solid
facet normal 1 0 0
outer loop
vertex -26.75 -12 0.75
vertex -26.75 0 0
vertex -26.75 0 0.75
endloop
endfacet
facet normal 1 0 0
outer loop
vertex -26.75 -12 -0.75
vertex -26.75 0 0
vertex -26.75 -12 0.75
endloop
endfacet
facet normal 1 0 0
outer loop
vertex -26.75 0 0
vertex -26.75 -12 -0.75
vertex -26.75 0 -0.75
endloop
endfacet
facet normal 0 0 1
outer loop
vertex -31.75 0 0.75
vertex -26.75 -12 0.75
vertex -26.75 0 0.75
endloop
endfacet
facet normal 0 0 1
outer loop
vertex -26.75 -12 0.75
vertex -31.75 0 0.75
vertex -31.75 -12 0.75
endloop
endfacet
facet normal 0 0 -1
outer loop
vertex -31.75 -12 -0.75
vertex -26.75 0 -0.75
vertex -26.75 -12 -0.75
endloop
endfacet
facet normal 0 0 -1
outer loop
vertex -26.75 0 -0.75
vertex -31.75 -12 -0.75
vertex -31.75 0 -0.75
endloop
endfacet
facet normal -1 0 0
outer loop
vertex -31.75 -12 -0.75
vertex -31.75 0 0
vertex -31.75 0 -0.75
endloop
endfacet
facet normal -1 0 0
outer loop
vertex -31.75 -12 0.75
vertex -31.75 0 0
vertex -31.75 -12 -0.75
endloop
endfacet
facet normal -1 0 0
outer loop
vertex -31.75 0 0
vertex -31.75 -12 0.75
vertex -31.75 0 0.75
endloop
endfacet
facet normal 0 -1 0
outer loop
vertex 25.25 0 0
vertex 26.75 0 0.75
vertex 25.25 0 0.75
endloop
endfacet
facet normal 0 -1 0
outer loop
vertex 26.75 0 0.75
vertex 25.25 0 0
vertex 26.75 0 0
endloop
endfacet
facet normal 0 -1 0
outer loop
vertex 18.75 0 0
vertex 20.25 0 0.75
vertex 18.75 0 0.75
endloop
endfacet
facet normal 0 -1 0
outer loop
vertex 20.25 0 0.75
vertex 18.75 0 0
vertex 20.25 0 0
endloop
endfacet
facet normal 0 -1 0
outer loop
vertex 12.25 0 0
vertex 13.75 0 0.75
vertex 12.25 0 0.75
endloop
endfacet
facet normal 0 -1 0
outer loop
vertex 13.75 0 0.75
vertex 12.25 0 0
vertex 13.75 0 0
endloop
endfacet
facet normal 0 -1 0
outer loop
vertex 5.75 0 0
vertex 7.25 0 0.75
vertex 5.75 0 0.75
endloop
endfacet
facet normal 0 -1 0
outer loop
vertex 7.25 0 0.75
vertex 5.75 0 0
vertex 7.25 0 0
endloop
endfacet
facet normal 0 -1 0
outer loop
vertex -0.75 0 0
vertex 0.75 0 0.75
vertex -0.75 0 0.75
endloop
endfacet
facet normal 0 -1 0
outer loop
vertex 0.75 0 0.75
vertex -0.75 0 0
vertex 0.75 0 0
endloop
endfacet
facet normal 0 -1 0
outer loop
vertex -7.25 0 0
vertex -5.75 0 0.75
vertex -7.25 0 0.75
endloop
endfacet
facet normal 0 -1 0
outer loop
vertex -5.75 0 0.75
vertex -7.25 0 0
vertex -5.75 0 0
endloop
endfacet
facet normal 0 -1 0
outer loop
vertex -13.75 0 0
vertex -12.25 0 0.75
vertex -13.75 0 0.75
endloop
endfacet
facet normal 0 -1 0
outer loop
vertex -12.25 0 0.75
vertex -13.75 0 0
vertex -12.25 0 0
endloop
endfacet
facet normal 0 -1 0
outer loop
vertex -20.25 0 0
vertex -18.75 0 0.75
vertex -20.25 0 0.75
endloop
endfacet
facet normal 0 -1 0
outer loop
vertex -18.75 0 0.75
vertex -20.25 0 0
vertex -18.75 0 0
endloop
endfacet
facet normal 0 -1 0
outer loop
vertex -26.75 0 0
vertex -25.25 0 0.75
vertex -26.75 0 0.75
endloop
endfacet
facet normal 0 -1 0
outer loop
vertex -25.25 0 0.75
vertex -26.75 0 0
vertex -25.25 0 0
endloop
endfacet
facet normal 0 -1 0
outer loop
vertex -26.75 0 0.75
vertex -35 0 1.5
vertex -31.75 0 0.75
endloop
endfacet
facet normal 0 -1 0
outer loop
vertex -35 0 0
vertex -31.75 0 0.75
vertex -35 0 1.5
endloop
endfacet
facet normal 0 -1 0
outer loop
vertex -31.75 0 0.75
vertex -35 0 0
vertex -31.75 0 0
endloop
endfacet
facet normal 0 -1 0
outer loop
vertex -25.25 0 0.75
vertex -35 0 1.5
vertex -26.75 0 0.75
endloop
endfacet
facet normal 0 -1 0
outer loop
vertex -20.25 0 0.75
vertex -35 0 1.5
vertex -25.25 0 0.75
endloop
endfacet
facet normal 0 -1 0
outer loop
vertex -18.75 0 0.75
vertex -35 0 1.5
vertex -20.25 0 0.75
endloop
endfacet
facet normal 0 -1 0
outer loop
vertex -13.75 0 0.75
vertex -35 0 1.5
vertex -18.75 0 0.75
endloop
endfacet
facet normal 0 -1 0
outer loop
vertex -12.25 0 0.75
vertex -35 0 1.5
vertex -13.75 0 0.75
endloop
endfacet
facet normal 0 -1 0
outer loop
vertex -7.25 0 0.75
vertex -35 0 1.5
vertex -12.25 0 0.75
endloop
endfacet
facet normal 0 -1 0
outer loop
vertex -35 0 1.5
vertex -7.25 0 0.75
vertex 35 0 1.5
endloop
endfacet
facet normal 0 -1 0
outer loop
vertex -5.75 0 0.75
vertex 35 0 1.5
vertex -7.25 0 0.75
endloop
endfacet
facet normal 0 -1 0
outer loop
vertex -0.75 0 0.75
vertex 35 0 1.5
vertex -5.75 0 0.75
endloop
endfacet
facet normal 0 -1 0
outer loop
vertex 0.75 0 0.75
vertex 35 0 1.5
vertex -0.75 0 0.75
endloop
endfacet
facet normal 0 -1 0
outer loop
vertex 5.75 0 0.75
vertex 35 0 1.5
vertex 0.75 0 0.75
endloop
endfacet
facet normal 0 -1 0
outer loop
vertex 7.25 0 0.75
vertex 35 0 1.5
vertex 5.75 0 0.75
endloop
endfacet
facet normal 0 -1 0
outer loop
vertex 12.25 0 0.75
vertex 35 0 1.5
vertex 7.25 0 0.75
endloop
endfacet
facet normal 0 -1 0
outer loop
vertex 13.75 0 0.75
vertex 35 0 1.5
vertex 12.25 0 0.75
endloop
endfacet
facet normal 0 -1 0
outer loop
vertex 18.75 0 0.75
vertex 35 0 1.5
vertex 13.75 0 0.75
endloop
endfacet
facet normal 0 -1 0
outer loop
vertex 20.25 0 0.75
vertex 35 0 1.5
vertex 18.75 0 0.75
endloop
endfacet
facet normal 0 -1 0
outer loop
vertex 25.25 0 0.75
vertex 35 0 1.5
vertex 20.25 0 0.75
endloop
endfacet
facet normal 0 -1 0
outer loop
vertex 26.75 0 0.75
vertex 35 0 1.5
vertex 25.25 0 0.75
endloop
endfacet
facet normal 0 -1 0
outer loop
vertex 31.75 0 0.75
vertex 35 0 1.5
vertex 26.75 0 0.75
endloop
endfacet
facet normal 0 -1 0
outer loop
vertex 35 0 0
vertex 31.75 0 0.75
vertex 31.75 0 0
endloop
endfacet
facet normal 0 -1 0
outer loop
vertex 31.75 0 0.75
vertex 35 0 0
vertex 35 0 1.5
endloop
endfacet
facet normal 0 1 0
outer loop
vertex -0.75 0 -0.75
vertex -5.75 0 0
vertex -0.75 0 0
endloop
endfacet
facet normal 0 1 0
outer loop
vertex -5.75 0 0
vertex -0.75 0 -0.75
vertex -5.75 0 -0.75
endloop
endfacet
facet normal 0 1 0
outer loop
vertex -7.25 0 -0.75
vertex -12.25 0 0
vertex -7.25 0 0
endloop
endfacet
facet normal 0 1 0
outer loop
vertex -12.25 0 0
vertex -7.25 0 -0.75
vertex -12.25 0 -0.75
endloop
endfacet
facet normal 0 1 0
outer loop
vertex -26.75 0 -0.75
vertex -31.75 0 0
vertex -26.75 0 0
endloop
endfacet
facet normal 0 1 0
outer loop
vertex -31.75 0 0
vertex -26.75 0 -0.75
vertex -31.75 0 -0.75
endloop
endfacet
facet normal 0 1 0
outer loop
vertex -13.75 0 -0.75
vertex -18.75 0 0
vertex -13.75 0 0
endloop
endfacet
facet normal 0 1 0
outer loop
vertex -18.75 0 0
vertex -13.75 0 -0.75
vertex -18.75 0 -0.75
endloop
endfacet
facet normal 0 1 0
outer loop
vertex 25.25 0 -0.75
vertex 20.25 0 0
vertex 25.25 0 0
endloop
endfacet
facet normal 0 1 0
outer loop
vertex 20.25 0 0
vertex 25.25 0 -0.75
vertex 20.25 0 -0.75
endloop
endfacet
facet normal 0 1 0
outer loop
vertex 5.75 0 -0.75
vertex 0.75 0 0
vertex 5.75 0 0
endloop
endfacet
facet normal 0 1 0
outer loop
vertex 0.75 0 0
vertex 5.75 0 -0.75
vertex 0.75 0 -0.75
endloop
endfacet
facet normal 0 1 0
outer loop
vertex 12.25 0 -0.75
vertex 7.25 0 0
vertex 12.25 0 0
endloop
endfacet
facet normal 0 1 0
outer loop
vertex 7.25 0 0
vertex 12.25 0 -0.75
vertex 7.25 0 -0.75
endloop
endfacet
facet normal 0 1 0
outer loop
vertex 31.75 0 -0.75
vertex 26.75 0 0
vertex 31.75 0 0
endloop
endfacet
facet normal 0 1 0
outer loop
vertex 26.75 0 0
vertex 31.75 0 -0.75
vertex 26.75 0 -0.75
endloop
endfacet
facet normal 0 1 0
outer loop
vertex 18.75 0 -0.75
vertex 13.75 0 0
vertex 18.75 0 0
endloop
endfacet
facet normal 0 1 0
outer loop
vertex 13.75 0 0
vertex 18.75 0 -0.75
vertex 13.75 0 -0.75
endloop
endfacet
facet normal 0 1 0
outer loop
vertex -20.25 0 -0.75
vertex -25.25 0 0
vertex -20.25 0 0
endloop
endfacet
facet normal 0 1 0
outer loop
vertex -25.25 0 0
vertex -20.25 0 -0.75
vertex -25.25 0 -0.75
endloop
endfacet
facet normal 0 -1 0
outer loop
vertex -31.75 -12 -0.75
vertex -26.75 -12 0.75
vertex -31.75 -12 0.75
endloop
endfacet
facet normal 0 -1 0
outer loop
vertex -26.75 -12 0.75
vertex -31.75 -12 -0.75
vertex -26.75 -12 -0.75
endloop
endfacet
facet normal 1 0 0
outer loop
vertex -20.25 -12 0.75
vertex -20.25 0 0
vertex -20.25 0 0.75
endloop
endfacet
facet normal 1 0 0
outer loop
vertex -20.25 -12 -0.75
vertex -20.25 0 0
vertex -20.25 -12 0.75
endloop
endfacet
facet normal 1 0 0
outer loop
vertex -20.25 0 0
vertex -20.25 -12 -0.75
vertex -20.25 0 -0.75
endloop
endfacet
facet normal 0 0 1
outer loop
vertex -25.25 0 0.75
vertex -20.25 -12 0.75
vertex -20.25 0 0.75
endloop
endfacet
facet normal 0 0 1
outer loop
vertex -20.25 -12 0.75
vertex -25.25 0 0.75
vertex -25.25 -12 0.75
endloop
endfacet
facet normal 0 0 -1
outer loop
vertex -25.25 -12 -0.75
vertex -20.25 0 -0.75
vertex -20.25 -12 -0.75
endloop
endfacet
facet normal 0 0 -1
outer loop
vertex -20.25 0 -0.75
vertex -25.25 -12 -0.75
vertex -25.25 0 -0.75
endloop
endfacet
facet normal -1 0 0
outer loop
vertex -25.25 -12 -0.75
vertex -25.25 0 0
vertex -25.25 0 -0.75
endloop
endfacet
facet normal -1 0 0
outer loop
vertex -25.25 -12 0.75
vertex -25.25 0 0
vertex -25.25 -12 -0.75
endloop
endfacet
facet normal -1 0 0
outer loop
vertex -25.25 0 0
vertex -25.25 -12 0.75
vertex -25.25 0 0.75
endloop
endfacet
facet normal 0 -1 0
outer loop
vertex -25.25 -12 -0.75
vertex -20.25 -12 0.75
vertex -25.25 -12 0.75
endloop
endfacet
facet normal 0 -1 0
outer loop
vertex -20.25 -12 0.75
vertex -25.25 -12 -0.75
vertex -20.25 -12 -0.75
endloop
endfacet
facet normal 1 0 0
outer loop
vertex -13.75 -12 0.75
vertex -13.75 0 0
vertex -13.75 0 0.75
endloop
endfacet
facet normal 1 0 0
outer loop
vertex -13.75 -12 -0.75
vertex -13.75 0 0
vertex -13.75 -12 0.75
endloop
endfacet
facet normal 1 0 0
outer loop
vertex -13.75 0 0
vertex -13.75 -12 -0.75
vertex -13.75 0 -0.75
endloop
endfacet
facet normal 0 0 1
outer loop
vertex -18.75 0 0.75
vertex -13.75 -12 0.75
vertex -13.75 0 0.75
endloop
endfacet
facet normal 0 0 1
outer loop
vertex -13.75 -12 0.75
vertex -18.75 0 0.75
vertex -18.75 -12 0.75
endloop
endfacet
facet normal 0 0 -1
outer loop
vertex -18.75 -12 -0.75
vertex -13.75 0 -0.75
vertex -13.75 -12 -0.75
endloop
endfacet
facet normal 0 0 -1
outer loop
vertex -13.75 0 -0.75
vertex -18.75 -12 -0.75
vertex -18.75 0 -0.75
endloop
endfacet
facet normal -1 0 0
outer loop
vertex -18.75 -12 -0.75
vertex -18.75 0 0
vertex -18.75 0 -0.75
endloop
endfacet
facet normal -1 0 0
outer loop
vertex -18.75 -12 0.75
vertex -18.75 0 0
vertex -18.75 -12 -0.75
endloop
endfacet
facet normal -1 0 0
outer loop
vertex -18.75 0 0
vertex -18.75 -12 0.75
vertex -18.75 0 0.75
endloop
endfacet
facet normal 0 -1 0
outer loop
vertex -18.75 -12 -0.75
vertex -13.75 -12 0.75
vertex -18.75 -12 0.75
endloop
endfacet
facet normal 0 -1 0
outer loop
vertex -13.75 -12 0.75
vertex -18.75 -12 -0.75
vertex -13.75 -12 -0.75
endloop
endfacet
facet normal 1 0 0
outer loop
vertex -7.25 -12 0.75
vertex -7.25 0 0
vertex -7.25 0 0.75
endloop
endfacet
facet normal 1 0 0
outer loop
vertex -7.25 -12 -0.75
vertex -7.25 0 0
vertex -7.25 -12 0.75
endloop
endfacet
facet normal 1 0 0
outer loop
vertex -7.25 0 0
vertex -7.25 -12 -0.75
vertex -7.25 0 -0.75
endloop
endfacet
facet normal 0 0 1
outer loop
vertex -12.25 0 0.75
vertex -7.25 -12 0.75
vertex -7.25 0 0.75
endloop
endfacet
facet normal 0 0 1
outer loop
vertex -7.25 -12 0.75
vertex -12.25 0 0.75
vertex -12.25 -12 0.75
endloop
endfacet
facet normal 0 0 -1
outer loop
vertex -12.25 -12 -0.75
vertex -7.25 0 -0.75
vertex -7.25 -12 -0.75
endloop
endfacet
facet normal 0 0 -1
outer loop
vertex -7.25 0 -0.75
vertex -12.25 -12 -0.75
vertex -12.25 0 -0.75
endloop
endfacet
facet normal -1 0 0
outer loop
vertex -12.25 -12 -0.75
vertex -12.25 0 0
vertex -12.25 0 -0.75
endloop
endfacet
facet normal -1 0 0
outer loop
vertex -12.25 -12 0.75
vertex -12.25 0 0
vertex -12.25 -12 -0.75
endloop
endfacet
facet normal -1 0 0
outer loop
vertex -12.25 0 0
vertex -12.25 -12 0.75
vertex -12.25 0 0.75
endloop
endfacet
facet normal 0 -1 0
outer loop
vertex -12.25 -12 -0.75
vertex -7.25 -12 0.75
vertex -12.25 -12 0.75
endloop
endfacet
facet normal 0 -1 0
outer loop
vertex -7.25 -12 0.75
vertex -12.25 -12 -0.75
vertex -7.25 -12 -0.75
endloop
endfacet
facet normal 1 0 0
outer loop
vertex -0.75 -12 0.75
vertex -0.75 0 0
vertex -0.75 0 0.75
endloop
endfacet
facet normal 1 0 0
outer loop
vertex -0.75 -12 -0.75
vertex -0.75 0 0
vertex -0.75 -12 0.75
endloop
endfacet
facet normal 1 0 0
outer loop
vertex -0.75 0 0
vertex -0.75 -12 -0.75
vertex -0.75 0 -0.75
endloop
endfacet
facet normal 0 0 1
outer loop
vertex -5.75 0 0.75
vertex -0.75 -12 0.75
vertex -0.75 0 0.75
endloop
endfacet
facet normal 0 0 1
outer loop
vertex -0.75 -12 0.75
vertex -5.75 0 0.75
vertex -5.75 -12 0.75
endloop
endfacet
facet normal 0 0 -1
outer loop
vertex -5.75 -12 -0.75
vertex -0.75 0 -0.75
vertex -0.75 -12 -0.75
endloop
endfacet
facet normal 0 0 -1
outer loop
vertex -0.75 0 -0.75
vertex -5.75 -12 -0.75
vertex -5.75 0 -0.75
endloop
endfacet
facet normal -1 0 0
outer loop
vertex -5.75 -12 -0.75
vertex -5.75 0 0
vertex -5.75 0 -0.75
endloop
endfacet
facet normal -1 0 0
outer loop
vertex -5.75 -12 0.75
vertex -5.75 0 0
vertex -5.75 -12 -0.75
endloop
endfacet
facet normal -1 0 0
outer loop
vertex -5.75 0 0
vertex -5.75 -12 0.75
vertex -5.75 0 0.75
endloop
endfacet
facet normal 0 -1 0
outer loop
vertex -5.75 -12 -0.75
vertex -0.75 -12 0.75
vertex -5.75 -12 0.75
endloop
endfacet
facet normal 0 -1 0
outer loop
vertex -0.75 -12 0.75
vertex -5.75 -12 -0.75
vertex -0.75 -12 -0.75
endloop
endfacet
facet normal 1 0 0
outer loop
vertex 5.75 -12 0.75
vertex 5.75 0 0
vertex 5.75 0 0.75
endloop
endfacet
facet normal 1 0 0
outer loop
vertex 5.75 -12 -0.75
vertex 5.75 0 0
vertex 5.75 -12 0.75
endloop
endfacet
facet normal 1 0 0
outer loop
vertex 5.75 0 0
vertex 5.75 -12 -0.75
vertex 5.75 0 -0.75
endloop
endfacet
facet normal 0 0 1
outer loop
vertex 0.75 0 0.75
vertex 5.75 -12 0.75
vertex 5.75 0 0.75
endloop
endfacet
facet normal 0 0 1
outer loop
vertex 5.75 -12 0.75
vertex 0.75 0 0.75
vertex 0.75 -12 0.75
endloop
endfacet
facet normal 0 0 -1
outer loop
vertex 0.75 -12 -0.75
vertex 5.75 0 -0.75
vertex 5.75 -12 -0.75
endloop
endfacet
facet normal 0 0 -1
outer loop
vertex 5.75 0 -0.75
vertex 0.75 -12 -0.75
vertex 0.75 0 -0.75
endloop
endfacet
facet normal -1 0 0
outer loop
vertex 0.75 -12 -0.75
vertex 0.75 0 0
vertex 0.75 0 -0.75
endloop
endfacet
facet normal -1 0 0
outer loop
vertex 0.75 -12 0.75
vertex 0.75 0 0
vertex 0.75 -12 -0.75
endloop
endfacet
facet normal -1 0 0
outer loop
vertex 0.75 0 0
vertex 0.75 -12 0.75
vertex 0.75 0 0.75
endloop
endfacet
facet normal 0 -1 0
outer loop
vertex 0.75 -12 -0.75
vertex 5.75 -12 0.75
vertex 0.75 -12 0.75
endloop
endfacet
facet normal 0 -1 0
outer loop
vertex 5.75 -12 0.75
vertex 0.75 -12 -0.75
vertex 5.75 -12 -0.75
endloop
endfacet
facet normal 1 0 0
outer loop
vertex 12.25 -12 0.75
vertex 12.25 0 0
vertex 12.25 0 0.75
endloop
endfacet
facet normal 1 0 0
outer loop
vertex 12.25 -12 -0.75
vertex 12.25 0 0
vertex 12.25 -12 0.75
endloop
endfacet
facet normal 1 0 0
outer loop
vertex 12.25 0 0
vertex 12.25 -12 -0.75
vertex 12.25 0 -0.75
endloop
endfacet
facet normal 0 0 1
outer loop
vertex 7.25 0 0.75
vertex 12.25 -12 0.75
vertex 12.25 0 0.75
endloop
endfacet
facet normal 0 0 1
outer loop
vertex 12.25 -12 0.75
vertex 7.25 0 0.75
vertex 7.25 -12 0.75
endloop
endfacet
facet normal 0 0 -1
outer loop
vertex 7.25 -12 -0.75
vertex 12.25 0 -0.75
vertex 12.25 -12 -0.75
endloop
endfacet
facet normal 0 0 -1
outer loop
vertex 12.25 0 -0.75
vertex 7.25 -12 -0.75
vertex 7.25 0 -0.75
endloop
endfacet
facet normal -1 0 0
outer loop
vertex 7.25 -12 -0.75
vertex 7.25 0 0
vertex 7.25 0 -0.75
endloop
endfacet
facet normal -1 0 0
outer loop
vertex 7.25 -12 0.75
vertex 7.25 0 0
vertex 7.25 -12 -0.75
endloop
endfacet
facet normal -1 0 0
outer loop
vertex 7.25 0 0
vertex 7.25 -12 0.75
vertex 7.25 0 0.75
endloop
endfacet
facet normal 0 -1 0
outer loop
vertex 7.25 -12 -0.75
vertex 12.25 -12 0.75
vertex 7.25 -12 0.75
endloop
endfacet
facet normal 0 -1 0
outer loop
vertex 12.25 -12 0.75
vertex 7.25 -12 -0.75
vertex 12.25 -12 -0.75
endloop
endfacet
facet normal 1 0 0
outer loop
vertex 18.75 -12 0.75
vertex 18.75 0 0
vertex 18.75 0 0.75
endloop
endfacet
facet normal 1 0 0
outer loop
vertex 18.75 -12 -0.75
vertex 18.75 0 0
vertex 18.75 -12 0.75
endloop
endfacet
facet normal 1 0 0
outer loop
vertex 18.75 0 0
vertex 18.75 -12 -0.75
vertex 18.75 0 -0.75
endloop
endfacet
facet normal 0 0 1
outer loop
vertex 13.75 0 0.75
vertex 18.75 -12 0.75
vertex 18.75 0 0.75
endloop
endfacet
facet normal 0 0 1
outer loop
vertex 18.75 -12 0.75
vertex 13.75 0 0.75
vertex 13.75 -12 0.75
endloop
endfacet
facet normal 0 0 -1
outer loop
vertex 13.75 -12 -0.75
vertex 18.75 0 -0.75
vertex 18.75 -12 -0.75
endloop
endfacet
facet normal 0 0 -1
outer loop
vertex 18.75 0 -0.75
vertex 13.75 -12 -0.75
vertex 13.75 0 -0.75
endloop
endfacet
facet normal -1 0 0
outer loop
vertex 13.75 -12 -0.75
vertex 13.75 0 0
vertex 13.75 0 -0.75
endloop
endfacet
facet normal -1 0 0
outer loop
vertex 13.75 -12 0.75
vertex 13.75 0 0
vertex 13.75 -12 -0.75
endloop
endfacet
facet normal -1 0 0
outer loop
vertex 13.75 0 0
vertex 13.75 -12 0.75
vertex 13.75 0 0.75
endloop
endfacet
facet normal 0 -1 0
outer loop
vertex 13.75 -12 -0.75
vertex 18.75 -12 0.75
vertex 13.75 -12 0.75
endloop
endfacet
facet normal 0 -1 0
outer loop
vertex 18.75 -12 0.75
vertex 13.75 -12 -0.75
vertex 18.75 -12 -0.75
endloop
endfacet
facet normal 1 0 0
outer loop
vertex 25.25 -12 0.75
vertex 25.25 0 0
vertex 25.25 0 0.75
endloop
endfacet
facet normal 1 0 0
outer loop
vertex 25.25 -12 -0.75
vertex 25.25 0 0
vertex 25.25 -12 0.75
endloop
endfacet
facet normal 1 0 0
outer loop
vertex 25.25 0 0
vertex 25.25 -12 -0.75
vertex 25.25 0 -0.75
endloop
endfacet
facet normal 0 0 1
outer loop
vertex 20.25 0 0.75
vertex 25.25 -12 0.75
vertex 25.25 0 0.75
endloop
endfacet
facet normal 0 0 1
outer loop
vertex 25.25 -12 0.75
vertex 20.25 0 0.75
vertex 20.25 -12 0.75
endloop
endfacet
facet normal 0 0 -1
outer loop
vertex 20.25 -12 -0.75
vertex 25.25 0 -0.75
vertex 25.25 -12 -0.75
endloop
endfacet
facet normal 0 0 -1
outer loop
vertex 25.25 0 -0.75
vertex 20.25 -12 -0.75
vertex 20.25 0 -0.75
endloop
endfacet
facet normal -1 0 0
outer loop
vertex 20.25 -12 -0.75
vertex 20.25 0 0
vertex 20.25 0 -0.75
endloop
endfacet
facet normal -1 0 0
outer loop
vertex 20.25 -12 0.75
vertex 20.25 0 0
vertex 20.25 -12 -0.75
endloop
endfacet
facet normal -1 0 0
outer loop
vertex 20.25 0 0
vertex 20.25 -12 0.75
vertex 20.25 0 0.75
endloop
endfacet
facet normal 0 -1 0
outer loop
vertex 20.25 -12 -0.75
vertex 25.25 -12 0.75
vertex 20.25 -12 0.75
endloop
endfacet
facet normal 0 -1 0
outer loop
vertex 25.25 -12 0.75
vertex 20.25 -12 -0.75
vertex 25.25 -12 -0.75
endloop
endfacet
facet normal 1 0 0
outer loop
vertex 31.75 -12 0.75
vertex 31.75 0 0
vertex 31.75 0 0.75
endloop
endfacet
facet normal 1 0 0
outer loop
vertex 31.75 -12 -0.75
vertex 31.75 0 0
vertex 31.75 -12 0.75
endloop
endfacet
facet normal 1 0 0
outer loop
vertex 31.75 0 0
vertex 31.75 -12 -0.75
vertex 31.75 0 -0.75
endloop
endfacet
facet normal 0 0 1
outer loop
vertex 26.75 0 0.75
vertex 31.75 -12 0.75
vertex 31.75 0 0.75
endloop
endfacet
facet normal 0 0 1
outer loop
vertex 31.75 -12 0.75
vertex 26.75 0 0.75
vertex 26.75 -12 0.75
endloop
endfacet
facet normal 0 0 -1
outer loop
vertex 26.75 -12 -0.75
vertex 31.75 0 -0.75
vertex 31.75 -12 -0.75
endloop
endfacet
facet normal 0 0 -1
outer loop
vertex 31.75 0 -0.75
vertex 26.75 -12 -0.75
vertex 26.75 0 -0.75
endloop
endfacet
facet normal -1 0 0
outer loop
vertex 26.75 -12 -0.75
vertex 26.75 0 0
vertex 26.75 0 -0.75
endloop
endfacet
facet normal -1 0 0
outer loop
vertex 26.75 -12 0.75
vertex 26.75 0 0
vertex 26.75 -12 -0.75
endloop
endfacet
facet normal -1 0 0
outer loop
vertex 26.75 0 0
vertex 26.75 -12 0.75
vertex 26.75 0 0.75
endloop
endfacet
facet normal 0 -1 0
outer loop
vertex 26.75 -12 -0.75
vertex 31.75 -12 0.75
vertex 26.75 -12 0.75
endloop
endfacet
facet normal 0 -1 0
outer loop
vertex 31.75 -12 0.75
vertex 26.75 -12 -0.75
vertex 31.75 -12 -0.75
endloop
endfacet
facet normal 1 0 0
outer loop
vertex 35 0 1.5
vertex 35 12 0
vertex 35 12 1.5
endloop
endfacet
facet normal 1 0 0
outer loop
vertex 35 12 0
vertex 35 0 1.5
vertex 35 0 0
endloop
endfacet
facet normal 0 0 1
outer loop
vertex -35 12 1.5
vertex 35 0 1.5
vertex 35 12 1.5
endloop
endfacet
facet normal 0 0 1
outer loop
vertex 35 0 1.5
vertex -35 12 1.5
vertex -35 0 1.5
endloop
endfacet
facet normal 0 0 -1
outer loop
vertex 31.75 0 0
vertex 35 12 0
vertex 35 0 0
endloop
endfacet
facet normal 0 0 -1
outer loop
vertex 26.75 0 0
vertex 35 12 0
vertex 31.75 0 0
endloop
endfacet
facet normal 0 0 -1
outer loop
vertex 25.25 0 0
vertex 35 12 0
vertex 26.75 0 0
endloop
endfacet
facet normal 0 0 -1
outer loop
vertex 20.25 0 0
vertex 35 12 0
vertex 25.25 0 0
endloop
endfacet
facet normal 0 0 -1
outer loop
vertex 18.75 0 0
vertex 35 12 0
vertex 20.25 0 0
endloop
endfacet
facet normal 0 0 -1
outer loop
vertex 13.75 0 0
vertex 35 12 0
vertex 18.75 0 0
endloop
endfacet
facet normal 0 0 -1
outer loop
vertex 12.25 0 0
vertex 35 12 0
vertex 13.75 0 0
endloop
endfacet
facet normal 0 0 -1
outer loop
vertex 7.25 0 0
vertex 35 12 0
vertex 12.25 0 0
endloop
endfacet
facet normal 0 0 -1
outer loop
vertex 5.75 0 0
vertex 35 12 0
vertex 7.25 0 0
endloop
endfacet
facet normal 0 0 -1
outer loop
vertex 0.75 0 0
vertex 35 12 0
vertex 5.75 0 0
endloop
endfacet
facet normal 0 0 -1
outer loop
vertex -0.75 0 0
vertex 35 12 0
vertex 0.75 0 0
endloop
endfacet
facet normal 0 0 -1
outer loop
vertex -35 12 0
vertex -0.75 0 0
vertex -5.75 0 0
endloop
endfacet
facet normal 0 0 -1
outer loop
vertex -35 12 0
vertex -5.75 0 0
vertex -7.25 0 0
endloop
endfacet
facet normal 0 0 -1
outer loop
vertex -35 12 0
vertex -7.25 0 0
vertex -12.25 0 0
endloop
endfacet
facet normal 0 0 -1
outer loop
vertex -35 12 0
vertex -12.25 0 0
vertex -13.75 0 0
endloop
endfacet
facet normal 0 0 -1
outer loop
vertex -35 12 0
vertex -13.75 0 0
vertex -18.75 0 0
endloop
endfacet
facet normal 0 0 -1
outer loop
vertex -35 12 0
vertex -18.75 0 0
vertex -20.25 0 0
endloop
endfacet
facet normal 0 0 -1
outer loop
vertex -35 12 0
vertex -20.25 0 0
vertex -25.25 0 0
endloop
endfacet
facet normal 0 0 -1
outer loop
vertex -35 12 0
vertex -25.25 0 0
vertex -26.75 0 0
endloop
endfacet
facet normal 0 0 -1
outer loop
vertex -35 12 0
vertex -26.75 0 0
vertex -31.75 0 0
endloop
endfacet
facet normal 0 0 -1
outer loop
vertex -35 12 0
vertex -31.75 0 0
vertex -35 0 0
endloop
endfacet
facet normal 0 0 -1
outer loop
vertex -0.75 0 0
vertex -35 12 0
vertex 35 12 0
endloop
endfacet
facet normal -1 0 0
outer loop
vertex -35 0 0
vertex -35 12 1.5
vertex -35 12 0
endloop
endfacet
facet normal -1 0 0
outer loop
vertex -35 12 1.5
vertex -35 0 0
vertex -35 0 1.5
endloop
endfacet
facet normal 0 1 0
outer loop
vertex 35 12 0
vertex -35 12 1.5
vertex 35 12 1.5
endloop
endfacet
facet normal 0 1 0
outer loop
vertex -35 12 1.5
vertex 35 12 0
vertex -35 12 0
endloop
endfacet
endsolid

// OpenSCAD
// --- Dimensions ---
plate_thickness = 1.5;    // Z height of the plate
spine_length = 70;        // X length of the spine
spine_width = 12;         // Y width of the spine
num_teeth = 10;           // Number of teeth
tooth_width = 5.0;        // X width of each tooth
tooth_length = 12;        // Y length of each tooth (hanging in -Y)
gap_width = 1.5;          // Y gap between teeth

// --- Calculated Values ---
// Total width of one tooth + one gap
feature_pitch = tooth_width + gap_width;
// Total width of the tooth row (10 teeth, 9 gaps)
total_tooth_row_width = (num_teeth * tooth_width) + ((num_teeth - 1) * gap_width);
// Offset to center the tooth row on the spine in X
// The spine is centered at X=0. The tooth row spans from -total_tooth_row_width/2 to +total_tooth_row_width/2.
// We need to position the teeth such that they hang from the spine.
// The spine is at Y=[0, spine_width] (or similar). Let's place the spine at Y=[0, spine_width].
// The teeth hang in -Y direction. So the teeth are at Y=[-tooth_length, 0].
// The spine is at Y=[0, spine_width].
// The teeth are attached to the edge at Y=0.

// --- Module Definitions ---

module spine() {
    // Spine is centered on X, starts at Y=0, goes to Y=spine_width
    // To center on X: X goes from -spine_length/2 to +spine_length/2
    translate([-spine_length/2, 0, 0]) {
        cube([spine_length, spine_width, plate_thickness], center=false);
    }
}

module tooth(i) {
    // Each tooth is i-th tooth (0 to 9)
    // Center X of the i-th tooth:
    // The first tooth (i=0) is at the left? Or right? Let's assume i=0 is left.
    // The center of the entire row is X=0.
    // The left edge of the first tooth is at -total_tooth_row_width/2.
    // The center of the first tooth is at -total_tooth_row_width/2 + tooth_width/2.
    // Let's calculate the center X for tooth i.
    // Center X_i = -total_tooth_row_width/2 + tooth_width/2 + i * feature_pitch
    
    tooth_center_x = -total_tooth_row_width/2 + tooth_width/2 + i * feature_pitch;
    tooth_center_y = -tooth_length/2; // Hanging in -Y, so center is at -tooth_length/2
    
    translate([tooth_center_x, tooth_center_y, 0]) {
        cube([tooth_width, tooth_length, plate_thickness], center=true);
    }
}

// --- Main Assembly ---
union() {
    spine();
    
    for (i = [0 : num_teeth - 1]) {
        tooth(i);
    }
}
